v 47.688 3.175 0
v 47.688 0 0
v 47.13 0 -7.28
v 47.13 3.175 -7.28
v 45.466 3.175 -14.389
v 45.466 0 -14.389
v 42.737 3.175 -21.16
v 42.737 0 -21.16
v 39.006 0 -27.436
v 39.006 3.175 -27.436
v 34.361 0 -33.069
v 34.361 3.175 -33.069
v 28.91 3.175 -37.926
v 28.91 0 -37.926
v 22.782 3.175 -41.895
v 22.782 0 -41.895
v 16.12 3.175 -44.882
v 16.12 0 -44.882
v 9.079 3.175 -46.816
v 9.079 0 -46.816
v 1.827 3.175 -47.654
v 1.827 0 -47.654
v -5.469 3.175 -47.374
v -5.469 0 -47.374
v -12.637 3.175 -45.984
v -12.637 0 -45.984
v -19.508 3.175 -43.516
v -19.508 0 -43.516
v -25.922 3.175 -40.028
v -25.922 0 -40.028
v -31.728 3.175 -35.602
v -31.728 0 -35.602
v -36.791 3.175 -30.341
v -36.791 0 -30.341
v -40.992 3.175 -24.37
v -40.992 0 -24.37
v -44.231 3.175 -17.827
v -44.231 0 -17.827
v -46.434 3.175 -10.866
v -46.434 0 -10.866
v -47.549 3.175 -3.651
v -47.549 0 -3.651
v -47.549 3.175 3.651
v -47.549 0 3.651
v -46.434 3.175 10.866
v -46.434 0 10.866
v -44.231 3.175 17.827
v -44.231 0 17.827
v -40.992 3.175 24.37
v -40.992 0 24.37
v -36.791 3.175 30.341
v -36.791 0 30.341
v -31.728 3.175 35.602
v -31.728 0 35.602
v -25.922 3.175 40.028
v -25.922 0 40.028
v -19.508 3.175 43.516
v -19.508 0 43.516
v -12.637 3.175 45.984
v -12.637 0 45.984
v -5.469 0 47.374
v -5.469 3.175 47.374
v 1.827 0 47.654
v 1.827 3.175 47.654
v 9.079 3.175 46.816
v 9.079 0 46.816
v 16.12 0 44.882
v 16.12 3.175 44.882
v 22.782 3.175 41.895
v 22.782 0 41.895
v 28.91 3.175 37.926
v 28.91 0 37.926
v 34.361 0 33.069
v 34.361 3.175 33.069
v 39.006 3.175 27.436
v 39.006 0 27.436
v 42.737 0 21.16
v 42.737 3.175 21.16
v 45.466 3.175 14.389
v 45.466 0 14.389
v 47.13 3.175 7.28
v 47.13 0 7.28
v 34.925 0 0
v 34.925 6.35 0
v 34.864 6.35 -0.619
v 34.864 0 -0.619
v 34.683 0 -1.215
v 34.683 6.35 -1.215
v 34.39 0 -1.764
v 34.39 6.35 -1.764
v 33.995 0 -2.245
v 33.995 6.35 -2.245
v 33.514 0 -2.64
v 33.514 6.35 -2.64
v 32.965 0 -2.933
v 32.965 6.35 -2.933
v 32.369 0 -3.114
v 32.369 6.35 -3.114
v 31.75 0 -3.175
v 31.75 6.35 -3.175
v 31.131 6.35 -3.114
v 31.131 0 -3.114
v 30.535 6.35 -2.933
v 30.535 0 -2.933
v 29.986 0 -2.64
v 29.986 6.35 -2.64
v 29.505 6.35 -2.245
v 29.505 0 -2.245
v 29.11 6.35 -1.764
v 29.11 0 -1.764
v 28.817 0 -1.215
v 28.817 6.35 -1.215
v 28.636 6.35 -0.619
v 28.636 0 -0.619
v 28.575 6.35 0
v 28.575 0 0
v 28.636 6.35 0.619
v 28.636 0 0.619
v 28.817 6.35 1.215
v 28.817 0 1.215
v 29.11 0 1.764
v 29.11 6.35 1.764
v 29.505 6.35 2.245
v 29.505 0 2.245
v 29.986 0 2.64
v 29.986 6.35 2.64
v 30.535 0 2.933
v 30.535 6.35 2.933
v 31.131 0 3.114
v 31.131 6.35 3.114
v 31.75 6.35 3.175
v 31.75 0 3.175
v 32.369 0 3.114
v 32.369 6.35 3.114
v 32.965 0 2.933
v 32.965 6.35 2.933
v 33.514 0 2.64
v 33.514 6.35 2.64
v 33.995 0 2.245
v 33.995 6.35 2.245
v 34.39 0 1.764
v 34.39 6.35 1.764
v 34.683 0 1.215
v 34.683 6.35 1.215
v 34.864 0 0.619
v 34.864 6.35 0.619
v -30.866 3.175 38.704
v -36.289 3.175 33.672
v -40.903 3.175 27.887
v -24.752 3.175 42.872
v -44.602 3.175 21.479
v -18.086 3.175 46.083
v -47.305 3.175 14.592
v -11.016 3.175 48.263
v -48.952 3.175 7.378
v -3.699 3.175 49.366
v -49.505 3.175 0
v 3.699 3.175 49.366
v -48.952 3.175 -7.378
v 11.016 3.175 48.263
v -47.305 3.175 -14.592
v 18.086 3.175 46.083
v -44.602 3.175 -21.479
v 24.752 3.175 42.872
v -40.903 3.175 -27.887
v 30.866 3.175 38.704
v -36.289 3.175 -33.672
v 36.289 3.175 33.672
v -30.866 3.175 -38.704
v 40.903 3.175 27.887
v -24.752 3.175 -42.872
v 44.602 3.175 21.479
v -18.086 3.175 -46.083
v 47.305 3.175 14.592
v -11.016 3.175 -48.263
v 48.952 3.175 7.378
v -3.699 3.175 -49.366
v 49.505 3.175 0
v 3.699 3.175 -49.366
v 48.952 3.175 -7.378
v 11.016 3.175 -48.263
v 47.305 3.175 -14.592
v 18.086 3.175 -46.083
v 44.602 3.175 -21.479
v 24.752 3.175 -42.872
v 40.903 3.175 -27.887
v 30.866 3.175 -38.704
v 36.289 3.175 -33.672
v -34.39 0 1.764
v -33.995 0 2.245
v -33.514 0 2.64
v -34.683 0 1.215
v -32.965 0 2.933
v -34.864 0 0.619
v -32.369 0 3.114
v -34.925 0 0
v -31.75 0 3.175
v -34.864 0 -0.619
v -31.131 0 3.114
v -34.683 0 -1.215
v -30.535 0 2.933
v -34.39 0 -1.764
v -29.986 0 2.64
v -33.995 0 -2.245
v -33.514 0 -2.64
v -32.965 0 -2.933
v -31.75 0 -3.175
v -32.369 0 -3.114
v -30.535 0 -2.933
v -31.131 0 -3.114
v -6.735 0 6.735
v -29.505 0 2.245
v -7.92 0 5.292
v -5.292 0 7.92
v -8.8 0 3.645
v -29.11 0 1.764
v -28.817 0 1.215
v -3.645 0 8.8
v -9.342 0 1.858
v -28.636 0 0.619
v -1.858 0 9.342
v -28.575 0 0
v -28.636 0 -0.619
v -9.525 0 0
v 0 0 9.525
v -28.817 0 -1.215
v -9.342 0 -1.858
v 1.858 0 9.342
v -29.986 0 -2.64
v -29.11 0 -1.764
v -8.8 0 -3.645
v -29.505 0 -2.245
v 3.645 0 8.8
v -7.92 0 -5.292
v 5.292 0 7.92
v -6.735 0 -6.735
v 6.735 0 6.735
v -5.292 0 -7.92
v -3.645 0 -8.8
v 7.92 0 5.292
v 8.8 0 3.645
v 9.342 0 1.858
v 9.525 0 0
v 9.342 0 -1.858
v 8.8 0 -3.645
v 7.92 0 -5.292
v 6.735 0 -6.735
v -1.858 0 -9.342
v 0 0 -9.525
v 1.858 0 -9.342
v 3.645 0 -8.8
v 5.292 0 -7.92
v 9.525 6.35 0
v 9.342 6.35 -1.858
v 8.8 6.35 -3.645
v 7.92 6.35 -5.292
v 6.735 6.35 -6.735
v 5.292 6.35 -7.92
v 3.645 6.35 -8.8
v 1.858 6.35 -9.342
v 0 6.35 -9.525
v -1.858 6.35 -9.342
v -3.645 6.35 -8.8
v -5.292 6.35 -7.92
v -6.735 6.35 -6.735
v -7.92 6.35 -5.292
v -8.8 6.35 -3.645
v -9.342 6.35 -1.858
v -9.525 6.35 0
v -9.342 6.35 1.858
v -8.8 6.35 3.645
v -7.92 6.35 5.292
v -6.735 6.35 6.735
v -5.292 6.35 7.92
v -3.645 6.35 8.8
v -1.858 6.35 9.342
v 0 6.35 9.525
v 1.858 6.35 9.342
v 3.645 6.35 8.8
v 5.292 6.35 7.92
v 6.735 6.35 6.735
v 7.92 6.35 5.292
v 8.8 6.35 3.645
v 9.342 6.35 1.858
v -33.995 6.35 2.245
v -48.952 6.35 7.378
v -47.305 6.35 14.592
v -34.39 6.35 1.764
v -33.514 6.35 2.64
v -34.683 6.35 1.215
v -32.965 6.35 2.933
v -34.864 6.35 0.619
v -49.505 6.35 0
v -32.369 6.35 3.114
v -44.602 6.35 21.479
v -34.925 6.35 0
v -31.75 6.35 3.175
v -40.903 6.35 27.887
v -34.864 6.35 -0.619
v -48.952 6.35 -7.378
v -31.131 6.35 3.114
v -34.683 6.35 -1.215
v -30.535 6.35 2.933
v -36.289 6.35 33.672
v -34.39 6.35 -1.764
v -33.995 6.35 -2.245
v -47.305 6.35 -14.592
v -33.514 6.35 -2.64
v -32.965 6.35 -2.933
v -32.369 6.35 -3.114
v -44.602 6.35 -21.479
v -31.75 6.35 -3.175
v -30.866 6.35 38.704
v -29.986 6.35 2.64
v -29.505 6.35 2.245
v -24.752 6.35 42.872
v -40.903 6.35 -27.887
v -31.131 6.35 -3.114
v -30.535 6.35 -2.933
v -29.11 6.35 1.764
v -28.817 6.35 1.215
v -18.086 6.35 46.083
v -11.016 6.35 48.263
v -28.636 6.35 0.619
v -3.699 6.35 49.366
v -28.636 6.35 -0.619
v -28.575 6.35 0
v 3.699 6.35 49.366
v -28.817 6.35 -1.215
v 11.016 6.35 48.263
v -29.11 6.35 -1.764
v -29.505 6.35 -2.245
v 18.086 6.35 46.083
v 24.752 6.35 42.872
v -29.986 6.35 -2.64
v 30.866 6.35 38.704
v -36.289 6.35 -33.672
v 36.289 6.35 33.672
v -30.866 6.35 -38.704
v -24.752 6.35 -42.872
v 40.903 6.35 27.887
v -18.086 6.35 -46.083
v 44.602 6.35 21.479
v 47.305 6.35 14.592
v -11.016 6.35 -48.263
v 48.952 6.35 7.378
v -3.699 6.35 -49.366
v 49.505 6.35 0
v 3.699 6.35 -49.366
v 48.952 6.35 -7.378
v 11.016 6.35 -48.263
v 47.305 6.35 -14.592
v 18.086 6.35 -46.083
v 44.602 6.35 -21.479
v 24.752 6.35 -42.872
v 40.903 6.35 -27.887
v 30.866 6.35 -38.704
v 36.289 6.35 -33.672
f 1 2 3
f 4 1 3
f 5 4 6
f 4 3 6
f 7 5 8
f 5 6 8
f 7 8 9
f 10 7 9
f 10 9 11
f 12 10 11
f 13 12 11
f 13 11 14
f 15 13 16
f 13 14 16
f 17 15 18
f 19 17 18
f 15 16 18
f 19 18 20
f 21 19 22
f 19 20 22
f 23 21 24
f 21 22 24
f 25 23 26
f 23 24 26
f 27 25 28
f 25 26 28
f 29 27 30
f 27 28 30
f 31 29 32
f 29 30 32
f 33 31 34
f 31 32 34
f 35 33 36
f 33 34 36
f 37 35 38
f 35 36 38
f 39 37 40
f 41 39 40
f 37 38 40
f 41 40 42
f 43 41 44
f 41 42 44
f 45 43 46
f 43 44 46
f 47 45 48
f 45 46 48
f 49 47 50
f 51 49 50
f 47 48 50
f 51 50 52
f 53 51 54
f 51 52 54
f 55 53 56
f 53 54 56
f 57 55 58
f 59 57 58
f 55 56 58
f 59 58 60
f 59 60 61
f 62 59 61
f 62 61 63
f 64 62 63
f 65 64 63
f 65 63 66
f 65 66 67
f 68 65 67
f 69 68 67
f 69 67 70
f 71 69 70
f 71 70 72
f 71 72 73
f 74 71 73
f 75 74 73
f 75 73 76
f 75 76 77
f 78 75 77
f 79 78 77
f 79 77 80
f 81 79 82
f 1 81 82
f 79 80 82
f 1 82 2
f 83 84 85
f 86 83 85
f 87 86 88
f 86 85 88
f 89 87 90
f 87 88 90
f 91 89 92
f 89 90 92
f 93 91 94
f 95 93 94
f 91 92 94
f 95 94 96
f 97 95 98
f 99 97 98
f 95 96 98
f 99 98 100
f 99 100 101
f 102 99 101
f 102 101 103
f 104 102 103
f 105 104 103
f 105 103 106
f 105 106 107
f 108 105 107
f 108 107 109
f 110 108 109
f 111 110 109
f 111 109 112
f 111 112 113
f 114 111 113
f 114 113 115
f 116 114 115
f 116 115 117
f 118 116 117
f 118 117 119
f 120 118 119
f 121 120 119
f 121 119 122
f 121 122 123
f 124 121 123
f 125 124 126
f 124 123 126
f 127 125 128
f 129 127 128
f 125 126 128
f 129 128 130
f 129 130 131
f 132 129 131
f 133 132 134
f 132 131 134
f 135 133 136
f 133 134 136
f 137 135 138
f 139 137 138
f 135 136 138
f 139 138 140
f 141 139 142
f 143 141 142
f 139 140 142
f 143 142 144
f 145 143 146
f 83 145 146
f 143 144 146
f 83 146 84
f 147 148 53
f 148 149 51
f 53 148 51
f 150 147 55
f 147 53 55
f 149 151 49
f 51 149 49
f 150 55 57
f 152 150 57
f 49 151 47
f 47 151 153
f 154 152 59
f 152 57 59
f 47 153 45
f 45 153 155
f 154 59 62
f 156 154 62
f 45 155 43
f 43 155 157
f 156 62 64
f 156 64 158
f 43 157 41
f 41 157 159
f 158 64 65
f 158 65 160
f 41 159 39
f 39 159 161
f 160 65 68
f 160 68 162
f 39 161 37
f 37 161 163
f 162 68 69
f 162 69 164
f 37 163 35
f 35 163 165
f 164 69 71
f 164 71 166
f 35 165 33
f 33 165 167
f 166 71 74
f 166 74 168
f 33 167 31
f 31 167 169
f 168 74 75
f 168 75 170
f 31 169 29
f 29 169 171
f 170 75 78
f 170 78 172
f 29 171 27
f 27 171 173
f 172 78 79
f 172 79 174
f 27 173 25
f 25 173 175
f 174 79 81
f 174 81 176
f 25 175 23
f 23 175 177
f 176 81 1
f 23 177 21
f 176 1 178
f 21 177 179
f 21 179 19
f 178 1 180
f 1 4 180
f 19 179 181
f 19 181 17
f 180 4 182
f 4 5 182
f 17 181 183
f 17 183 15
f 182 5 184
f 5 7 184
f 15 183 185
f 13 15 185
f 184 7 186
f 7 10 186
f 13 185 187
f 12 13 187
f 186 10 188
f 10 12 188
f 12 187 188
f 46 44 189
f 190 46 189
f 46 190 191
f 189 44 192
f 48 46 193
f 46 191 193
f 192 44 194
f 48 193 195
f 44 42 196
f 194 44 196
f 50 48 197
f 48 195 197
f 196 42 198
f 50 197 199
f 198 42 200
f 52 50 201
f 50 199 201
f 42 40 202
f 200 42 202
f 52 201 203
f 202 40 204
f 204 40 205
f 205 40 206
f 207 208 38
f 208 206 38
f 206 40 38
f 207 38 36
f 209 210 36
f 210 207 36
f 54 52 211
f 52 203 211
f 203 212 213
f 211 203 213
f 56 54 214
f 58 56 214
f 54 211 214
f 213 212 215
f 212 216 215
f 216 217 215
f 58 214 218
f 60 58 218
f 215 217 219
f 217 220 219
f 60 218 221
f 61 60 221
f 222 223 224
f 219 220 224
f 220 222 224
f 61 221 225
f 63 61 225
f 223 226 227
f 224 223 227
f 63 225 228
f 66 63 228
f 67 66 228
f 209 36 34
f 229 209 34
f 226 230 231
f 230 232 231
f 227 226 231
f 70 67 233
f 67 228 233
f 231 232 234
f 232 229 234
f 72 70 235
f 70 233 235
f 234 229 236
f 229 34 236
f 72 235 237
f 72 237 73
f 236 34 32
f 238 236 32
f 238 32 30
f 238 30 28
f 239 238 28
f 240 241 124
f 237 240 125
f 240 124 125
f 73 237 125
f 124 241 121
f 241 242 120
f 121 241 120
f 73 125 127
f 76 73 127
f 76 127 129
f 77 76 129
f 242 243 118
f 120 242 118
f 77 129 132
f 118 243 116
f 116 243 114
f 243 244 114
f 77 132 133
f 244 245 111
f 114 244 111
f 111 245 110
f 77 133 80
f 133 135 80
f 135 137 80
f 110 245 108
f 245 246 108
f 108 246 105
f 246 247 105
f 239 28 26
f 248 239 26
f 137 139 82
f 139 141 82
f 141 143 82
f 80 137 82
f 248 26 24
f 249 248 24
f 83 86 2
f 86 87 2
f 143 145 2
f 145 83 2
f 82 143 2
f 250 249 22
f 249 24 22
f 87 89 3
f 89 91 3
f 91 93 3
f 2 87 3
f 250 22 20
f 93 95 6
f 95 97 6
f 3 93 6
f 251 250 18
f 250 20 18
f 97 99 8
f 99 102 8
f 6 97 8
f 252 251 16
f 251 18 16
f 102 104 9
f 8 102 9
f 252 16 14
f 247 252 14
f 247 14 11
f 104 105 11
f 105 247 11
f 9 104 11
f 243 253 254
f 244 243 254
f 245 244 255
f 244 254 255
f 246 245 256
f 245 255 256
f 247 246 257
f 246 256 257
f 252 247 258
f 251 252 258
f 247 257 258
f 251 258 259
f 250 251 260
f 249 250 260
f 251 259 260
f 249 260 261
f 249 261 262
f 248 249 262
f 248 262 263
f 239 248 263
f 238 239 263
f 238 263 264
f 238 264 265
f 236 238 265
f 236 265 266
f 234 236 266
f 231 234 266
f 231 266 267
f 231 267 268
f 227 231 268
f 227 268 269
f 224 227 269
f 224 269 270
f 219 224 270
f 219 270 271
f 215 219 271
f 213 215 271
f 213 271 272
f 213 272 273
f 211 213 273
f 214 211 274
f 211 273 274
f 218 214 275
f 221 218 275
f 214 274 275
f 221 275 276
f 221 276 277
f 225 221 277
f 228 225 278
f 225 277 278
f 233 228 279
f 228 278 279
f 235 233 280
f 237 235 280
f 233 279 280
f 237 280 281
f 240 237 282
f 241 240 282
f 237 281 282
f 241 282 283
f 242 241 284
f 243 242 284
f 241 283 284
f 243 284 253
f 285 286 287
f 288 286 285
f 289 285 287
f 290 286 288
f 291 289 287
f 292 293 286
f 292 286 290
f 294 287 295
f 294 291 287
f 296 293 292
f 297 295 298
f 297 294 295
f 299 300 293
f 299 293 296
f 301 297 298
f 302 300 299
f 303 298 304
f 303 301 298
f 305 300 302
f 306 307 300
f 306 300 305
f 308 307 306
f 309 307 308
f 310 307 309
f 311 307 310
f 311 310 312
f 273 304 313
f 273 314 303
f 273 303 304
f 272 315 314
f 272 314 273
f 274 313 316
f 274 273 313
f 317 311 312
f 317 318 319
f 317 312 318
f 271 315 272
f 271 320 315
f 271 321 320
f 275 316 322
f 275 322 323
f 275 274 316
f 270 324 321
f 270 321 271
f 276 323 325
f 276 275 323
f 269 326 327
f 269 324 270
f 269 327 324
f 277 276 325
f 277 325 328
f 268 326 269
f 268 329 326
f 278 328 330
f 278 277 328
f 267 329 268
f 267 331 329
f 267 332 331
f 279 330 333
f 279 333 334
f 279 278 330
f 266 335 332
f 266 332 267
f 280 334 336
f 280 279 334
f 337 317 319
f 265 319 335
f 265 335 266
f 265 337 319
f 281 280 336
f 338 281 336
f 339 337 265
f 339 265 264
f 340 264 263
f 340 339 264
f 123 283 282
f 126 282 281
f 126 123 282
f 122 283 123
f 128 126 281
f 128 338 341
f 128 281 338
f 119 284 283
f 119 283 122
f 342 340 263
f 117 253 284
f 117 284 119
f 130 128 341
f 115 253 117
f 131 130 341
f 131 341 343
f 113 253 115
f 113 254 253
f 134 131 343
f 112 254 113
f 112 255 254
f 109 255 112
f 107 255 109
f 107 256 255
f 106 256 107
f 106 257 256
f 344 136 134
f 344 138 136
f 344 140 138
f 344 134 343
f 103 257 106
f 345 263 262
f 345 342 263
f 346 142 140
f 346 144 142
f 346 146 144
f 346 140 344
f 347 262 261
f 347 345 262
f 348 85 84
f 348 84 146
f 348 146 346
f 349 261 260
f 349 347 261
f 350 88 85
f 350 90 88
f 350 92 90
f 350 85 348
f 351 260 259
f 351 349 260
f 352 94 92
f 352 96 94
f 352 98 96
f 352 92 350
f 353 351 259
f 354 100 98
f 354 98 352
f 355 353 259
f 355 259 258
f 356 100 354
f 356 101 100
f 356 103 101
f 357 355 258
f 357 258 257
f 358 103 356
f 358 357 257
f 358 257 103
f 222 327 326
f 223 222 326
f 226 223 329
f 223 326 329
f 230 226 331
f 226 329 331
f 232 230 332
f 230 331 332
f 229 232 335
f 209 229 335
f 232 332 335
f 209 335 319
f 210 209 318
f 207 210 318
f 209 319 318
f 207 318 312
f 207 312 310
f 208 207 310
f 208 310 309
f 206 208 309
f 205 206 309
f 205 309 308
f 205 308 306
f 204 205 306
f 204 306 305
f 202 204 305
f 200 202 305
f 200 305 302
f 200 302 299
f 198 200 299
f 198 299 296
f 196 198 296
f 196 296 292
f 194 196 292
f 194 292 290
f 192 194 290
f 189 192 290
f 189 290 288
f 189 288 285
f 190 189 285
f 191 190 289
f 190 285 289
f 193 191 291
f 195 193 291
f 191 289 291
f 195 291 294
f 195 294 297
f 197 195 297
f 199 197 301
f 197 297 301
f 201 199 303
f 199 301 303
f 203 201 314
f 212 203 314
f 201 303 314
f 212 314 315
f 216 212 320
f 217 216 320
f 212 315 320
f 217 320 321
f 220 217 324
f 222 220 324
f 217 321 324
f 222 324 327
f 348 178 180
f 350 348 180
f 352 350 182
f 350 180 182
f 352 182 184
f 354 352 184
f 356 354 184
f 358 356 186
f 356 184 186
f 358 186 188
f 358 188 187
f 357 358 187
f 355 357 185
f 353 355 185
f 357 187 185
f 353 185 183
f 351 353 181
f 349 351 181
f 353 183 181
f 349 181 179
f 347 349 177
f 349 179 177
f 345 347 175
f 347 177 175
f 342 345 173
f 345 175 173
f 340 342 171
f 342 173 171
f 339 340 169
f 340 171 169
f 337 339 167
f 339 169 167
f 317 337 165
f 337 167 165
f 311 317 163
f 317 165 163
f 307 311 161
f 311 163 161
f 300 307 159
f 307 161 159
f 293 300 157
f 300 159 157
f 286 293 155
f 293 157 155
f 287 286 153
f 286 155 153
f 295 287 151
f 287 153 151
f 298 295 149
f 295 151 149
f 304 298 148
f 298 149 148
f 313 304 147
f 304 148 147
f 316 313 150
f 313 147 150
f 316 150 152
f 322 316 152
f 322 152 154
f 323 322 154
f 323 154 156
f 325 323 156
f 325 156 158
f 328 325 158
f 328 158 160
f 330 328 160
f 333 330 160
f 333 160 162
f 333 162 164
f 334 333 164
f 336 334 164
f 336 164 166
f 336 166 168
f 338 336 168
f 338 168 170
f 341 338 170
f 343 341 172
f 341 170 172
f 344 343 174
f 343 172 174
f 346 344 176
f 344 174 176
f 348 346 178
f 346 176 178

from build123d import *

# Parameters (mm, degrees)
SKETCH1_R           = 47.6885
BOSS_EXTRUDE1_DEPTH = 3.175
SKETCH2_R           = 49.5046
BOSS_EXTRUDE2_DEPTH = 3.175
SKETCH3_R           = 3.175
SKETCH3_R_2         = 9.525
CUT_EXTRUDE1_DEPTH  = 7.35


with BuildPart() as part:
    # Sketch1 → Boss-Extrude1 (new body)
    with BuildSketch(Plane(origin=(0, 0, 0), x_dir=(1, 0, 0), z_dir=(0, 1, 0))):
        Circle(SKETCH1_R)
    extrude(amount=BOSS_EXTRUDE1_DEPTH)

    # Sketch2 → Boss-Extrude2 (add)
    with BuildSketch(Plane(origin=(0, 3.175, 0), x_dir=(1, 0, 0), z_dir=(0, 1, 0))):
        Circle(SKETCH2_R)
    extrude(amount=BOSS_EXTRUDE2_DEPTH)

    # Sketch3 → Cut-Extrude1 (cut, through all)
    with BuildSketch(Plane(origin=(0, 6.35, 0), x_dir=(1, 0, 0), z_dir=(0, 1, 0))):
        with Locations((-31.75, 0)):
            Circle(SKETCH3_R)
        with Locations((31.75, 0)):
            Circle(SKETCH3_R)
        Circle(SKETCH3_R_2)
    extrude(amount=-CUT_EXTRUDE1_DEPTH, mode=Mode.SUBTRACT)


solid = part.part
